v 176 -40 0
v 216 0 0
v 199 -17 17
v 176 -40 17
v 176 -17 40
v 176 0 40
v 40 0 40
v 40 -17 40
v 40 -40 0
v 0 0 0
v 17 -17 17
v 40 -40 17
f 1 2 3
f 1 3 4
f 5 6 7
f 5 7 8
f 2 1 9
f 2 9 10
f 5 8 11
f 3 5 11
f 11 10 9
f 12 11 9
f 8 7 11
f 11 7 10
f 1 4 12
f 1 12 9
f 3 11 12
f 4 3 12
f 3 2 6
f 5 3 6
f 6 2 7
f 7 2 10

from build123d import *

# Parameters (mm, degrees)
BOSS_EXTRU_1_DEPTH      = 216
ENL_V_MAT_EXTRU_1_DEPTH = 41
ENL_V_MAT_EXTRU_2_DEPTH = 41


with BuildPart() as part:
    # Esquisse1 → Boss.-Extru.1 (new body)
    with BuildSketch(Plane(origin=(0, 0, 0), x_dir=(0, 0, -1), z_dir=(1, 0, 0))):
        Polygon((0, 0), (-40, 0), (-40, -17), (-17, -17), (-17, -40), (0, -40), align=None)
    extrude(amount=BOSS_EXTRU_1_DEPTH)

    # Esquisse2 → Enlèv. mat.-Extru.1 (cut, through all)
    with BuildSketch(Plane(origin=(0, 0, 0), x_dir=(1, 0, 0), z_dir=(0, 1, 0))):
        Polygon((216, 0), (176, -40), (216, -40), align=None)
        Polygon((0, 0), (0, -40), (40, -40), align=None)
    extrude(amount=-ENL_V_MAT_EXTRU_1_DEPTH, mode=Mode.SUBTRACT)

    # Esquisse3 → Enlèv. mat.-Extru.2 (cut, through all)
    with BuildSketch(Plane(origin=(0, 0, 0), x_dir=(-1, 0, 0), z_dir=(0, 0, -1))):
        Polygon((-216, 0), (-176, -40), (-216, -40), align=None)
        Polygon((-40, -40), (0, -40), (0, 0), align=None)
    extrude(amount=-ENL_V_MAT_EXTRU_2_DEPTH, mode=Mode.SUBTRACT)


solid = part.part
